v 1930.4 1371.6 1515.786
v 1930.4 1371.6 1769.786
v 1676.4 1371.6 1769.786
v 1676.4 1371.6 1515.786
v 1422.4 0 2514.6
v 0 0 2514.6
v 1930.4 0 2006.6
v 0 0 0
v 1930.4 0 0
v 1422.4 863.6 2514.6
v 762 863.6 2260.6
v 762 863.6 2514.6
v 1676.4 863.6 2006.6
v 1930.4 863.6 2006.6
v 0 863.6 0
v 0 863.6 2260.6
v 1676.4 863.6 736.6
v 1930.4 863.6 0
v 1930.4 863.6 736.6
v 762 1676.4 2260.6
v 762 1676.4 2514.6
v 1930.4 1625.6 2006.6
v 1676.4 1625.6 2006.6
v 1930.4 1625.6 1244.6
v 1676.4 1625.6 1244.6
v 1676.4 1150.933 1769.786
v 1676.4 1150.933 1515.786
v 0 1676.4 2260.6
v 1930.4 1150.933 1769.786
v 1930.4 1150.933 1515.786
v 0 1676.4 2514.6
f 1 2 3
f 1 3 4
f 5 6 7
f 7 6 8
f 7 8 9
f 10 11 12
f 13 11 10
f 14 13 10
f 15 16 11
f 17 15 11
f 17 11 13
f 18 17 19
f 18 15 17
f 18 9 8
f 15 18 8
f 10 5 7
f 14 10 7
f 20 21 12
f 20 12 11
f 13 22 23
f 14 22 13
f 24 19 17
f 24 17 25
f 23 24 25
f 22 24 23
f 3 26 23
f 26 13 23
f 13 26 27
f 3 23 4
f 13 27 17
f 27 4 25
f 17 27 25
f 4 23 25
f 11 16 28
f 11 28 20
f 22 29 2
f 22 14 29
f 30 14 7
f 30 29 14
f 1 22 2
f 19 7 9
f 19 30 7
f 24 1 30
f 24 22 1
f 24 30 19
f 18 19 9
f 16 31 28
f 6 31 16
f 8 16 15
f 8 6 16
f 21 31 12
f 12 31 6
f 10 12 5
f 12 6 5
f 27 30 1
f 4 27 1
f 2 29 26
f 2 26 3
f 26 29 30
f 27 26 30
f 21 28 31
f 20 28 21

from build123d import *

# Parameters (mm, degrees)
BOSS_EXTRUDE1_DEPTH = 863.6
SKETCH4_W           = 762
SKETCH4_H           = 254
BOSS_EXTRUDE2_DEPTH = 812.8
SKETCH8_W           = 254
SKETCH8_H           = 220.666548299
BOSS_EXTRUDE4_DEPTH = 254


with BuildPart() as part:
    # Sketch1 → Boss-Extrude1 (new body)
    with BuildSketch(Plane(origin=(0, 0, 0), x_dir=(1, 0, 0), z_dir=(0, 1, 0))):
        Polygon((0, 0), (0, -2514.6), (1422.4, -2514.6), (1930.4, -2006.6), (1930.4, 0), align=None)
    extrude(amount=BOSS_EXTRUDE1_DEPTH)

    # Sketch4 → Boss-Extrude2 (add)
    with BuildSketch(Plane(origin=(0, 863.6, 0), x_dir=(1, 0, 0), z_dir=(0, 1, 0))):
        with Locations((381, -2387.6)):
            Rectangle(SKETCH4_W, SKETCH4_H)
    extrude(amount=BOSS_EXTRUDE2_DEPTH)

    # Sketch8 → Boss-Extrude4 (add)
    with BuildSketch(Plane(origin=(1930.4, 0, 0), x_dir=(0, 0, -1), z_dir=(1, 0, 0))):
        Polygon((-2006.6, 863.6), (-736.6, 863.6), (-1244.6, 1625.6), (-2006.6, 1625.6), align=None)
        with Locations((-1642.786067738, 1261.266725851)):
            Rectangle(SKETCH8_W, SKETCH8_H, mode=Mode.SUBTRACT)
    extrude(amount=-BOSS_EXTRUDE4_DEPTH)


solid = part.part
